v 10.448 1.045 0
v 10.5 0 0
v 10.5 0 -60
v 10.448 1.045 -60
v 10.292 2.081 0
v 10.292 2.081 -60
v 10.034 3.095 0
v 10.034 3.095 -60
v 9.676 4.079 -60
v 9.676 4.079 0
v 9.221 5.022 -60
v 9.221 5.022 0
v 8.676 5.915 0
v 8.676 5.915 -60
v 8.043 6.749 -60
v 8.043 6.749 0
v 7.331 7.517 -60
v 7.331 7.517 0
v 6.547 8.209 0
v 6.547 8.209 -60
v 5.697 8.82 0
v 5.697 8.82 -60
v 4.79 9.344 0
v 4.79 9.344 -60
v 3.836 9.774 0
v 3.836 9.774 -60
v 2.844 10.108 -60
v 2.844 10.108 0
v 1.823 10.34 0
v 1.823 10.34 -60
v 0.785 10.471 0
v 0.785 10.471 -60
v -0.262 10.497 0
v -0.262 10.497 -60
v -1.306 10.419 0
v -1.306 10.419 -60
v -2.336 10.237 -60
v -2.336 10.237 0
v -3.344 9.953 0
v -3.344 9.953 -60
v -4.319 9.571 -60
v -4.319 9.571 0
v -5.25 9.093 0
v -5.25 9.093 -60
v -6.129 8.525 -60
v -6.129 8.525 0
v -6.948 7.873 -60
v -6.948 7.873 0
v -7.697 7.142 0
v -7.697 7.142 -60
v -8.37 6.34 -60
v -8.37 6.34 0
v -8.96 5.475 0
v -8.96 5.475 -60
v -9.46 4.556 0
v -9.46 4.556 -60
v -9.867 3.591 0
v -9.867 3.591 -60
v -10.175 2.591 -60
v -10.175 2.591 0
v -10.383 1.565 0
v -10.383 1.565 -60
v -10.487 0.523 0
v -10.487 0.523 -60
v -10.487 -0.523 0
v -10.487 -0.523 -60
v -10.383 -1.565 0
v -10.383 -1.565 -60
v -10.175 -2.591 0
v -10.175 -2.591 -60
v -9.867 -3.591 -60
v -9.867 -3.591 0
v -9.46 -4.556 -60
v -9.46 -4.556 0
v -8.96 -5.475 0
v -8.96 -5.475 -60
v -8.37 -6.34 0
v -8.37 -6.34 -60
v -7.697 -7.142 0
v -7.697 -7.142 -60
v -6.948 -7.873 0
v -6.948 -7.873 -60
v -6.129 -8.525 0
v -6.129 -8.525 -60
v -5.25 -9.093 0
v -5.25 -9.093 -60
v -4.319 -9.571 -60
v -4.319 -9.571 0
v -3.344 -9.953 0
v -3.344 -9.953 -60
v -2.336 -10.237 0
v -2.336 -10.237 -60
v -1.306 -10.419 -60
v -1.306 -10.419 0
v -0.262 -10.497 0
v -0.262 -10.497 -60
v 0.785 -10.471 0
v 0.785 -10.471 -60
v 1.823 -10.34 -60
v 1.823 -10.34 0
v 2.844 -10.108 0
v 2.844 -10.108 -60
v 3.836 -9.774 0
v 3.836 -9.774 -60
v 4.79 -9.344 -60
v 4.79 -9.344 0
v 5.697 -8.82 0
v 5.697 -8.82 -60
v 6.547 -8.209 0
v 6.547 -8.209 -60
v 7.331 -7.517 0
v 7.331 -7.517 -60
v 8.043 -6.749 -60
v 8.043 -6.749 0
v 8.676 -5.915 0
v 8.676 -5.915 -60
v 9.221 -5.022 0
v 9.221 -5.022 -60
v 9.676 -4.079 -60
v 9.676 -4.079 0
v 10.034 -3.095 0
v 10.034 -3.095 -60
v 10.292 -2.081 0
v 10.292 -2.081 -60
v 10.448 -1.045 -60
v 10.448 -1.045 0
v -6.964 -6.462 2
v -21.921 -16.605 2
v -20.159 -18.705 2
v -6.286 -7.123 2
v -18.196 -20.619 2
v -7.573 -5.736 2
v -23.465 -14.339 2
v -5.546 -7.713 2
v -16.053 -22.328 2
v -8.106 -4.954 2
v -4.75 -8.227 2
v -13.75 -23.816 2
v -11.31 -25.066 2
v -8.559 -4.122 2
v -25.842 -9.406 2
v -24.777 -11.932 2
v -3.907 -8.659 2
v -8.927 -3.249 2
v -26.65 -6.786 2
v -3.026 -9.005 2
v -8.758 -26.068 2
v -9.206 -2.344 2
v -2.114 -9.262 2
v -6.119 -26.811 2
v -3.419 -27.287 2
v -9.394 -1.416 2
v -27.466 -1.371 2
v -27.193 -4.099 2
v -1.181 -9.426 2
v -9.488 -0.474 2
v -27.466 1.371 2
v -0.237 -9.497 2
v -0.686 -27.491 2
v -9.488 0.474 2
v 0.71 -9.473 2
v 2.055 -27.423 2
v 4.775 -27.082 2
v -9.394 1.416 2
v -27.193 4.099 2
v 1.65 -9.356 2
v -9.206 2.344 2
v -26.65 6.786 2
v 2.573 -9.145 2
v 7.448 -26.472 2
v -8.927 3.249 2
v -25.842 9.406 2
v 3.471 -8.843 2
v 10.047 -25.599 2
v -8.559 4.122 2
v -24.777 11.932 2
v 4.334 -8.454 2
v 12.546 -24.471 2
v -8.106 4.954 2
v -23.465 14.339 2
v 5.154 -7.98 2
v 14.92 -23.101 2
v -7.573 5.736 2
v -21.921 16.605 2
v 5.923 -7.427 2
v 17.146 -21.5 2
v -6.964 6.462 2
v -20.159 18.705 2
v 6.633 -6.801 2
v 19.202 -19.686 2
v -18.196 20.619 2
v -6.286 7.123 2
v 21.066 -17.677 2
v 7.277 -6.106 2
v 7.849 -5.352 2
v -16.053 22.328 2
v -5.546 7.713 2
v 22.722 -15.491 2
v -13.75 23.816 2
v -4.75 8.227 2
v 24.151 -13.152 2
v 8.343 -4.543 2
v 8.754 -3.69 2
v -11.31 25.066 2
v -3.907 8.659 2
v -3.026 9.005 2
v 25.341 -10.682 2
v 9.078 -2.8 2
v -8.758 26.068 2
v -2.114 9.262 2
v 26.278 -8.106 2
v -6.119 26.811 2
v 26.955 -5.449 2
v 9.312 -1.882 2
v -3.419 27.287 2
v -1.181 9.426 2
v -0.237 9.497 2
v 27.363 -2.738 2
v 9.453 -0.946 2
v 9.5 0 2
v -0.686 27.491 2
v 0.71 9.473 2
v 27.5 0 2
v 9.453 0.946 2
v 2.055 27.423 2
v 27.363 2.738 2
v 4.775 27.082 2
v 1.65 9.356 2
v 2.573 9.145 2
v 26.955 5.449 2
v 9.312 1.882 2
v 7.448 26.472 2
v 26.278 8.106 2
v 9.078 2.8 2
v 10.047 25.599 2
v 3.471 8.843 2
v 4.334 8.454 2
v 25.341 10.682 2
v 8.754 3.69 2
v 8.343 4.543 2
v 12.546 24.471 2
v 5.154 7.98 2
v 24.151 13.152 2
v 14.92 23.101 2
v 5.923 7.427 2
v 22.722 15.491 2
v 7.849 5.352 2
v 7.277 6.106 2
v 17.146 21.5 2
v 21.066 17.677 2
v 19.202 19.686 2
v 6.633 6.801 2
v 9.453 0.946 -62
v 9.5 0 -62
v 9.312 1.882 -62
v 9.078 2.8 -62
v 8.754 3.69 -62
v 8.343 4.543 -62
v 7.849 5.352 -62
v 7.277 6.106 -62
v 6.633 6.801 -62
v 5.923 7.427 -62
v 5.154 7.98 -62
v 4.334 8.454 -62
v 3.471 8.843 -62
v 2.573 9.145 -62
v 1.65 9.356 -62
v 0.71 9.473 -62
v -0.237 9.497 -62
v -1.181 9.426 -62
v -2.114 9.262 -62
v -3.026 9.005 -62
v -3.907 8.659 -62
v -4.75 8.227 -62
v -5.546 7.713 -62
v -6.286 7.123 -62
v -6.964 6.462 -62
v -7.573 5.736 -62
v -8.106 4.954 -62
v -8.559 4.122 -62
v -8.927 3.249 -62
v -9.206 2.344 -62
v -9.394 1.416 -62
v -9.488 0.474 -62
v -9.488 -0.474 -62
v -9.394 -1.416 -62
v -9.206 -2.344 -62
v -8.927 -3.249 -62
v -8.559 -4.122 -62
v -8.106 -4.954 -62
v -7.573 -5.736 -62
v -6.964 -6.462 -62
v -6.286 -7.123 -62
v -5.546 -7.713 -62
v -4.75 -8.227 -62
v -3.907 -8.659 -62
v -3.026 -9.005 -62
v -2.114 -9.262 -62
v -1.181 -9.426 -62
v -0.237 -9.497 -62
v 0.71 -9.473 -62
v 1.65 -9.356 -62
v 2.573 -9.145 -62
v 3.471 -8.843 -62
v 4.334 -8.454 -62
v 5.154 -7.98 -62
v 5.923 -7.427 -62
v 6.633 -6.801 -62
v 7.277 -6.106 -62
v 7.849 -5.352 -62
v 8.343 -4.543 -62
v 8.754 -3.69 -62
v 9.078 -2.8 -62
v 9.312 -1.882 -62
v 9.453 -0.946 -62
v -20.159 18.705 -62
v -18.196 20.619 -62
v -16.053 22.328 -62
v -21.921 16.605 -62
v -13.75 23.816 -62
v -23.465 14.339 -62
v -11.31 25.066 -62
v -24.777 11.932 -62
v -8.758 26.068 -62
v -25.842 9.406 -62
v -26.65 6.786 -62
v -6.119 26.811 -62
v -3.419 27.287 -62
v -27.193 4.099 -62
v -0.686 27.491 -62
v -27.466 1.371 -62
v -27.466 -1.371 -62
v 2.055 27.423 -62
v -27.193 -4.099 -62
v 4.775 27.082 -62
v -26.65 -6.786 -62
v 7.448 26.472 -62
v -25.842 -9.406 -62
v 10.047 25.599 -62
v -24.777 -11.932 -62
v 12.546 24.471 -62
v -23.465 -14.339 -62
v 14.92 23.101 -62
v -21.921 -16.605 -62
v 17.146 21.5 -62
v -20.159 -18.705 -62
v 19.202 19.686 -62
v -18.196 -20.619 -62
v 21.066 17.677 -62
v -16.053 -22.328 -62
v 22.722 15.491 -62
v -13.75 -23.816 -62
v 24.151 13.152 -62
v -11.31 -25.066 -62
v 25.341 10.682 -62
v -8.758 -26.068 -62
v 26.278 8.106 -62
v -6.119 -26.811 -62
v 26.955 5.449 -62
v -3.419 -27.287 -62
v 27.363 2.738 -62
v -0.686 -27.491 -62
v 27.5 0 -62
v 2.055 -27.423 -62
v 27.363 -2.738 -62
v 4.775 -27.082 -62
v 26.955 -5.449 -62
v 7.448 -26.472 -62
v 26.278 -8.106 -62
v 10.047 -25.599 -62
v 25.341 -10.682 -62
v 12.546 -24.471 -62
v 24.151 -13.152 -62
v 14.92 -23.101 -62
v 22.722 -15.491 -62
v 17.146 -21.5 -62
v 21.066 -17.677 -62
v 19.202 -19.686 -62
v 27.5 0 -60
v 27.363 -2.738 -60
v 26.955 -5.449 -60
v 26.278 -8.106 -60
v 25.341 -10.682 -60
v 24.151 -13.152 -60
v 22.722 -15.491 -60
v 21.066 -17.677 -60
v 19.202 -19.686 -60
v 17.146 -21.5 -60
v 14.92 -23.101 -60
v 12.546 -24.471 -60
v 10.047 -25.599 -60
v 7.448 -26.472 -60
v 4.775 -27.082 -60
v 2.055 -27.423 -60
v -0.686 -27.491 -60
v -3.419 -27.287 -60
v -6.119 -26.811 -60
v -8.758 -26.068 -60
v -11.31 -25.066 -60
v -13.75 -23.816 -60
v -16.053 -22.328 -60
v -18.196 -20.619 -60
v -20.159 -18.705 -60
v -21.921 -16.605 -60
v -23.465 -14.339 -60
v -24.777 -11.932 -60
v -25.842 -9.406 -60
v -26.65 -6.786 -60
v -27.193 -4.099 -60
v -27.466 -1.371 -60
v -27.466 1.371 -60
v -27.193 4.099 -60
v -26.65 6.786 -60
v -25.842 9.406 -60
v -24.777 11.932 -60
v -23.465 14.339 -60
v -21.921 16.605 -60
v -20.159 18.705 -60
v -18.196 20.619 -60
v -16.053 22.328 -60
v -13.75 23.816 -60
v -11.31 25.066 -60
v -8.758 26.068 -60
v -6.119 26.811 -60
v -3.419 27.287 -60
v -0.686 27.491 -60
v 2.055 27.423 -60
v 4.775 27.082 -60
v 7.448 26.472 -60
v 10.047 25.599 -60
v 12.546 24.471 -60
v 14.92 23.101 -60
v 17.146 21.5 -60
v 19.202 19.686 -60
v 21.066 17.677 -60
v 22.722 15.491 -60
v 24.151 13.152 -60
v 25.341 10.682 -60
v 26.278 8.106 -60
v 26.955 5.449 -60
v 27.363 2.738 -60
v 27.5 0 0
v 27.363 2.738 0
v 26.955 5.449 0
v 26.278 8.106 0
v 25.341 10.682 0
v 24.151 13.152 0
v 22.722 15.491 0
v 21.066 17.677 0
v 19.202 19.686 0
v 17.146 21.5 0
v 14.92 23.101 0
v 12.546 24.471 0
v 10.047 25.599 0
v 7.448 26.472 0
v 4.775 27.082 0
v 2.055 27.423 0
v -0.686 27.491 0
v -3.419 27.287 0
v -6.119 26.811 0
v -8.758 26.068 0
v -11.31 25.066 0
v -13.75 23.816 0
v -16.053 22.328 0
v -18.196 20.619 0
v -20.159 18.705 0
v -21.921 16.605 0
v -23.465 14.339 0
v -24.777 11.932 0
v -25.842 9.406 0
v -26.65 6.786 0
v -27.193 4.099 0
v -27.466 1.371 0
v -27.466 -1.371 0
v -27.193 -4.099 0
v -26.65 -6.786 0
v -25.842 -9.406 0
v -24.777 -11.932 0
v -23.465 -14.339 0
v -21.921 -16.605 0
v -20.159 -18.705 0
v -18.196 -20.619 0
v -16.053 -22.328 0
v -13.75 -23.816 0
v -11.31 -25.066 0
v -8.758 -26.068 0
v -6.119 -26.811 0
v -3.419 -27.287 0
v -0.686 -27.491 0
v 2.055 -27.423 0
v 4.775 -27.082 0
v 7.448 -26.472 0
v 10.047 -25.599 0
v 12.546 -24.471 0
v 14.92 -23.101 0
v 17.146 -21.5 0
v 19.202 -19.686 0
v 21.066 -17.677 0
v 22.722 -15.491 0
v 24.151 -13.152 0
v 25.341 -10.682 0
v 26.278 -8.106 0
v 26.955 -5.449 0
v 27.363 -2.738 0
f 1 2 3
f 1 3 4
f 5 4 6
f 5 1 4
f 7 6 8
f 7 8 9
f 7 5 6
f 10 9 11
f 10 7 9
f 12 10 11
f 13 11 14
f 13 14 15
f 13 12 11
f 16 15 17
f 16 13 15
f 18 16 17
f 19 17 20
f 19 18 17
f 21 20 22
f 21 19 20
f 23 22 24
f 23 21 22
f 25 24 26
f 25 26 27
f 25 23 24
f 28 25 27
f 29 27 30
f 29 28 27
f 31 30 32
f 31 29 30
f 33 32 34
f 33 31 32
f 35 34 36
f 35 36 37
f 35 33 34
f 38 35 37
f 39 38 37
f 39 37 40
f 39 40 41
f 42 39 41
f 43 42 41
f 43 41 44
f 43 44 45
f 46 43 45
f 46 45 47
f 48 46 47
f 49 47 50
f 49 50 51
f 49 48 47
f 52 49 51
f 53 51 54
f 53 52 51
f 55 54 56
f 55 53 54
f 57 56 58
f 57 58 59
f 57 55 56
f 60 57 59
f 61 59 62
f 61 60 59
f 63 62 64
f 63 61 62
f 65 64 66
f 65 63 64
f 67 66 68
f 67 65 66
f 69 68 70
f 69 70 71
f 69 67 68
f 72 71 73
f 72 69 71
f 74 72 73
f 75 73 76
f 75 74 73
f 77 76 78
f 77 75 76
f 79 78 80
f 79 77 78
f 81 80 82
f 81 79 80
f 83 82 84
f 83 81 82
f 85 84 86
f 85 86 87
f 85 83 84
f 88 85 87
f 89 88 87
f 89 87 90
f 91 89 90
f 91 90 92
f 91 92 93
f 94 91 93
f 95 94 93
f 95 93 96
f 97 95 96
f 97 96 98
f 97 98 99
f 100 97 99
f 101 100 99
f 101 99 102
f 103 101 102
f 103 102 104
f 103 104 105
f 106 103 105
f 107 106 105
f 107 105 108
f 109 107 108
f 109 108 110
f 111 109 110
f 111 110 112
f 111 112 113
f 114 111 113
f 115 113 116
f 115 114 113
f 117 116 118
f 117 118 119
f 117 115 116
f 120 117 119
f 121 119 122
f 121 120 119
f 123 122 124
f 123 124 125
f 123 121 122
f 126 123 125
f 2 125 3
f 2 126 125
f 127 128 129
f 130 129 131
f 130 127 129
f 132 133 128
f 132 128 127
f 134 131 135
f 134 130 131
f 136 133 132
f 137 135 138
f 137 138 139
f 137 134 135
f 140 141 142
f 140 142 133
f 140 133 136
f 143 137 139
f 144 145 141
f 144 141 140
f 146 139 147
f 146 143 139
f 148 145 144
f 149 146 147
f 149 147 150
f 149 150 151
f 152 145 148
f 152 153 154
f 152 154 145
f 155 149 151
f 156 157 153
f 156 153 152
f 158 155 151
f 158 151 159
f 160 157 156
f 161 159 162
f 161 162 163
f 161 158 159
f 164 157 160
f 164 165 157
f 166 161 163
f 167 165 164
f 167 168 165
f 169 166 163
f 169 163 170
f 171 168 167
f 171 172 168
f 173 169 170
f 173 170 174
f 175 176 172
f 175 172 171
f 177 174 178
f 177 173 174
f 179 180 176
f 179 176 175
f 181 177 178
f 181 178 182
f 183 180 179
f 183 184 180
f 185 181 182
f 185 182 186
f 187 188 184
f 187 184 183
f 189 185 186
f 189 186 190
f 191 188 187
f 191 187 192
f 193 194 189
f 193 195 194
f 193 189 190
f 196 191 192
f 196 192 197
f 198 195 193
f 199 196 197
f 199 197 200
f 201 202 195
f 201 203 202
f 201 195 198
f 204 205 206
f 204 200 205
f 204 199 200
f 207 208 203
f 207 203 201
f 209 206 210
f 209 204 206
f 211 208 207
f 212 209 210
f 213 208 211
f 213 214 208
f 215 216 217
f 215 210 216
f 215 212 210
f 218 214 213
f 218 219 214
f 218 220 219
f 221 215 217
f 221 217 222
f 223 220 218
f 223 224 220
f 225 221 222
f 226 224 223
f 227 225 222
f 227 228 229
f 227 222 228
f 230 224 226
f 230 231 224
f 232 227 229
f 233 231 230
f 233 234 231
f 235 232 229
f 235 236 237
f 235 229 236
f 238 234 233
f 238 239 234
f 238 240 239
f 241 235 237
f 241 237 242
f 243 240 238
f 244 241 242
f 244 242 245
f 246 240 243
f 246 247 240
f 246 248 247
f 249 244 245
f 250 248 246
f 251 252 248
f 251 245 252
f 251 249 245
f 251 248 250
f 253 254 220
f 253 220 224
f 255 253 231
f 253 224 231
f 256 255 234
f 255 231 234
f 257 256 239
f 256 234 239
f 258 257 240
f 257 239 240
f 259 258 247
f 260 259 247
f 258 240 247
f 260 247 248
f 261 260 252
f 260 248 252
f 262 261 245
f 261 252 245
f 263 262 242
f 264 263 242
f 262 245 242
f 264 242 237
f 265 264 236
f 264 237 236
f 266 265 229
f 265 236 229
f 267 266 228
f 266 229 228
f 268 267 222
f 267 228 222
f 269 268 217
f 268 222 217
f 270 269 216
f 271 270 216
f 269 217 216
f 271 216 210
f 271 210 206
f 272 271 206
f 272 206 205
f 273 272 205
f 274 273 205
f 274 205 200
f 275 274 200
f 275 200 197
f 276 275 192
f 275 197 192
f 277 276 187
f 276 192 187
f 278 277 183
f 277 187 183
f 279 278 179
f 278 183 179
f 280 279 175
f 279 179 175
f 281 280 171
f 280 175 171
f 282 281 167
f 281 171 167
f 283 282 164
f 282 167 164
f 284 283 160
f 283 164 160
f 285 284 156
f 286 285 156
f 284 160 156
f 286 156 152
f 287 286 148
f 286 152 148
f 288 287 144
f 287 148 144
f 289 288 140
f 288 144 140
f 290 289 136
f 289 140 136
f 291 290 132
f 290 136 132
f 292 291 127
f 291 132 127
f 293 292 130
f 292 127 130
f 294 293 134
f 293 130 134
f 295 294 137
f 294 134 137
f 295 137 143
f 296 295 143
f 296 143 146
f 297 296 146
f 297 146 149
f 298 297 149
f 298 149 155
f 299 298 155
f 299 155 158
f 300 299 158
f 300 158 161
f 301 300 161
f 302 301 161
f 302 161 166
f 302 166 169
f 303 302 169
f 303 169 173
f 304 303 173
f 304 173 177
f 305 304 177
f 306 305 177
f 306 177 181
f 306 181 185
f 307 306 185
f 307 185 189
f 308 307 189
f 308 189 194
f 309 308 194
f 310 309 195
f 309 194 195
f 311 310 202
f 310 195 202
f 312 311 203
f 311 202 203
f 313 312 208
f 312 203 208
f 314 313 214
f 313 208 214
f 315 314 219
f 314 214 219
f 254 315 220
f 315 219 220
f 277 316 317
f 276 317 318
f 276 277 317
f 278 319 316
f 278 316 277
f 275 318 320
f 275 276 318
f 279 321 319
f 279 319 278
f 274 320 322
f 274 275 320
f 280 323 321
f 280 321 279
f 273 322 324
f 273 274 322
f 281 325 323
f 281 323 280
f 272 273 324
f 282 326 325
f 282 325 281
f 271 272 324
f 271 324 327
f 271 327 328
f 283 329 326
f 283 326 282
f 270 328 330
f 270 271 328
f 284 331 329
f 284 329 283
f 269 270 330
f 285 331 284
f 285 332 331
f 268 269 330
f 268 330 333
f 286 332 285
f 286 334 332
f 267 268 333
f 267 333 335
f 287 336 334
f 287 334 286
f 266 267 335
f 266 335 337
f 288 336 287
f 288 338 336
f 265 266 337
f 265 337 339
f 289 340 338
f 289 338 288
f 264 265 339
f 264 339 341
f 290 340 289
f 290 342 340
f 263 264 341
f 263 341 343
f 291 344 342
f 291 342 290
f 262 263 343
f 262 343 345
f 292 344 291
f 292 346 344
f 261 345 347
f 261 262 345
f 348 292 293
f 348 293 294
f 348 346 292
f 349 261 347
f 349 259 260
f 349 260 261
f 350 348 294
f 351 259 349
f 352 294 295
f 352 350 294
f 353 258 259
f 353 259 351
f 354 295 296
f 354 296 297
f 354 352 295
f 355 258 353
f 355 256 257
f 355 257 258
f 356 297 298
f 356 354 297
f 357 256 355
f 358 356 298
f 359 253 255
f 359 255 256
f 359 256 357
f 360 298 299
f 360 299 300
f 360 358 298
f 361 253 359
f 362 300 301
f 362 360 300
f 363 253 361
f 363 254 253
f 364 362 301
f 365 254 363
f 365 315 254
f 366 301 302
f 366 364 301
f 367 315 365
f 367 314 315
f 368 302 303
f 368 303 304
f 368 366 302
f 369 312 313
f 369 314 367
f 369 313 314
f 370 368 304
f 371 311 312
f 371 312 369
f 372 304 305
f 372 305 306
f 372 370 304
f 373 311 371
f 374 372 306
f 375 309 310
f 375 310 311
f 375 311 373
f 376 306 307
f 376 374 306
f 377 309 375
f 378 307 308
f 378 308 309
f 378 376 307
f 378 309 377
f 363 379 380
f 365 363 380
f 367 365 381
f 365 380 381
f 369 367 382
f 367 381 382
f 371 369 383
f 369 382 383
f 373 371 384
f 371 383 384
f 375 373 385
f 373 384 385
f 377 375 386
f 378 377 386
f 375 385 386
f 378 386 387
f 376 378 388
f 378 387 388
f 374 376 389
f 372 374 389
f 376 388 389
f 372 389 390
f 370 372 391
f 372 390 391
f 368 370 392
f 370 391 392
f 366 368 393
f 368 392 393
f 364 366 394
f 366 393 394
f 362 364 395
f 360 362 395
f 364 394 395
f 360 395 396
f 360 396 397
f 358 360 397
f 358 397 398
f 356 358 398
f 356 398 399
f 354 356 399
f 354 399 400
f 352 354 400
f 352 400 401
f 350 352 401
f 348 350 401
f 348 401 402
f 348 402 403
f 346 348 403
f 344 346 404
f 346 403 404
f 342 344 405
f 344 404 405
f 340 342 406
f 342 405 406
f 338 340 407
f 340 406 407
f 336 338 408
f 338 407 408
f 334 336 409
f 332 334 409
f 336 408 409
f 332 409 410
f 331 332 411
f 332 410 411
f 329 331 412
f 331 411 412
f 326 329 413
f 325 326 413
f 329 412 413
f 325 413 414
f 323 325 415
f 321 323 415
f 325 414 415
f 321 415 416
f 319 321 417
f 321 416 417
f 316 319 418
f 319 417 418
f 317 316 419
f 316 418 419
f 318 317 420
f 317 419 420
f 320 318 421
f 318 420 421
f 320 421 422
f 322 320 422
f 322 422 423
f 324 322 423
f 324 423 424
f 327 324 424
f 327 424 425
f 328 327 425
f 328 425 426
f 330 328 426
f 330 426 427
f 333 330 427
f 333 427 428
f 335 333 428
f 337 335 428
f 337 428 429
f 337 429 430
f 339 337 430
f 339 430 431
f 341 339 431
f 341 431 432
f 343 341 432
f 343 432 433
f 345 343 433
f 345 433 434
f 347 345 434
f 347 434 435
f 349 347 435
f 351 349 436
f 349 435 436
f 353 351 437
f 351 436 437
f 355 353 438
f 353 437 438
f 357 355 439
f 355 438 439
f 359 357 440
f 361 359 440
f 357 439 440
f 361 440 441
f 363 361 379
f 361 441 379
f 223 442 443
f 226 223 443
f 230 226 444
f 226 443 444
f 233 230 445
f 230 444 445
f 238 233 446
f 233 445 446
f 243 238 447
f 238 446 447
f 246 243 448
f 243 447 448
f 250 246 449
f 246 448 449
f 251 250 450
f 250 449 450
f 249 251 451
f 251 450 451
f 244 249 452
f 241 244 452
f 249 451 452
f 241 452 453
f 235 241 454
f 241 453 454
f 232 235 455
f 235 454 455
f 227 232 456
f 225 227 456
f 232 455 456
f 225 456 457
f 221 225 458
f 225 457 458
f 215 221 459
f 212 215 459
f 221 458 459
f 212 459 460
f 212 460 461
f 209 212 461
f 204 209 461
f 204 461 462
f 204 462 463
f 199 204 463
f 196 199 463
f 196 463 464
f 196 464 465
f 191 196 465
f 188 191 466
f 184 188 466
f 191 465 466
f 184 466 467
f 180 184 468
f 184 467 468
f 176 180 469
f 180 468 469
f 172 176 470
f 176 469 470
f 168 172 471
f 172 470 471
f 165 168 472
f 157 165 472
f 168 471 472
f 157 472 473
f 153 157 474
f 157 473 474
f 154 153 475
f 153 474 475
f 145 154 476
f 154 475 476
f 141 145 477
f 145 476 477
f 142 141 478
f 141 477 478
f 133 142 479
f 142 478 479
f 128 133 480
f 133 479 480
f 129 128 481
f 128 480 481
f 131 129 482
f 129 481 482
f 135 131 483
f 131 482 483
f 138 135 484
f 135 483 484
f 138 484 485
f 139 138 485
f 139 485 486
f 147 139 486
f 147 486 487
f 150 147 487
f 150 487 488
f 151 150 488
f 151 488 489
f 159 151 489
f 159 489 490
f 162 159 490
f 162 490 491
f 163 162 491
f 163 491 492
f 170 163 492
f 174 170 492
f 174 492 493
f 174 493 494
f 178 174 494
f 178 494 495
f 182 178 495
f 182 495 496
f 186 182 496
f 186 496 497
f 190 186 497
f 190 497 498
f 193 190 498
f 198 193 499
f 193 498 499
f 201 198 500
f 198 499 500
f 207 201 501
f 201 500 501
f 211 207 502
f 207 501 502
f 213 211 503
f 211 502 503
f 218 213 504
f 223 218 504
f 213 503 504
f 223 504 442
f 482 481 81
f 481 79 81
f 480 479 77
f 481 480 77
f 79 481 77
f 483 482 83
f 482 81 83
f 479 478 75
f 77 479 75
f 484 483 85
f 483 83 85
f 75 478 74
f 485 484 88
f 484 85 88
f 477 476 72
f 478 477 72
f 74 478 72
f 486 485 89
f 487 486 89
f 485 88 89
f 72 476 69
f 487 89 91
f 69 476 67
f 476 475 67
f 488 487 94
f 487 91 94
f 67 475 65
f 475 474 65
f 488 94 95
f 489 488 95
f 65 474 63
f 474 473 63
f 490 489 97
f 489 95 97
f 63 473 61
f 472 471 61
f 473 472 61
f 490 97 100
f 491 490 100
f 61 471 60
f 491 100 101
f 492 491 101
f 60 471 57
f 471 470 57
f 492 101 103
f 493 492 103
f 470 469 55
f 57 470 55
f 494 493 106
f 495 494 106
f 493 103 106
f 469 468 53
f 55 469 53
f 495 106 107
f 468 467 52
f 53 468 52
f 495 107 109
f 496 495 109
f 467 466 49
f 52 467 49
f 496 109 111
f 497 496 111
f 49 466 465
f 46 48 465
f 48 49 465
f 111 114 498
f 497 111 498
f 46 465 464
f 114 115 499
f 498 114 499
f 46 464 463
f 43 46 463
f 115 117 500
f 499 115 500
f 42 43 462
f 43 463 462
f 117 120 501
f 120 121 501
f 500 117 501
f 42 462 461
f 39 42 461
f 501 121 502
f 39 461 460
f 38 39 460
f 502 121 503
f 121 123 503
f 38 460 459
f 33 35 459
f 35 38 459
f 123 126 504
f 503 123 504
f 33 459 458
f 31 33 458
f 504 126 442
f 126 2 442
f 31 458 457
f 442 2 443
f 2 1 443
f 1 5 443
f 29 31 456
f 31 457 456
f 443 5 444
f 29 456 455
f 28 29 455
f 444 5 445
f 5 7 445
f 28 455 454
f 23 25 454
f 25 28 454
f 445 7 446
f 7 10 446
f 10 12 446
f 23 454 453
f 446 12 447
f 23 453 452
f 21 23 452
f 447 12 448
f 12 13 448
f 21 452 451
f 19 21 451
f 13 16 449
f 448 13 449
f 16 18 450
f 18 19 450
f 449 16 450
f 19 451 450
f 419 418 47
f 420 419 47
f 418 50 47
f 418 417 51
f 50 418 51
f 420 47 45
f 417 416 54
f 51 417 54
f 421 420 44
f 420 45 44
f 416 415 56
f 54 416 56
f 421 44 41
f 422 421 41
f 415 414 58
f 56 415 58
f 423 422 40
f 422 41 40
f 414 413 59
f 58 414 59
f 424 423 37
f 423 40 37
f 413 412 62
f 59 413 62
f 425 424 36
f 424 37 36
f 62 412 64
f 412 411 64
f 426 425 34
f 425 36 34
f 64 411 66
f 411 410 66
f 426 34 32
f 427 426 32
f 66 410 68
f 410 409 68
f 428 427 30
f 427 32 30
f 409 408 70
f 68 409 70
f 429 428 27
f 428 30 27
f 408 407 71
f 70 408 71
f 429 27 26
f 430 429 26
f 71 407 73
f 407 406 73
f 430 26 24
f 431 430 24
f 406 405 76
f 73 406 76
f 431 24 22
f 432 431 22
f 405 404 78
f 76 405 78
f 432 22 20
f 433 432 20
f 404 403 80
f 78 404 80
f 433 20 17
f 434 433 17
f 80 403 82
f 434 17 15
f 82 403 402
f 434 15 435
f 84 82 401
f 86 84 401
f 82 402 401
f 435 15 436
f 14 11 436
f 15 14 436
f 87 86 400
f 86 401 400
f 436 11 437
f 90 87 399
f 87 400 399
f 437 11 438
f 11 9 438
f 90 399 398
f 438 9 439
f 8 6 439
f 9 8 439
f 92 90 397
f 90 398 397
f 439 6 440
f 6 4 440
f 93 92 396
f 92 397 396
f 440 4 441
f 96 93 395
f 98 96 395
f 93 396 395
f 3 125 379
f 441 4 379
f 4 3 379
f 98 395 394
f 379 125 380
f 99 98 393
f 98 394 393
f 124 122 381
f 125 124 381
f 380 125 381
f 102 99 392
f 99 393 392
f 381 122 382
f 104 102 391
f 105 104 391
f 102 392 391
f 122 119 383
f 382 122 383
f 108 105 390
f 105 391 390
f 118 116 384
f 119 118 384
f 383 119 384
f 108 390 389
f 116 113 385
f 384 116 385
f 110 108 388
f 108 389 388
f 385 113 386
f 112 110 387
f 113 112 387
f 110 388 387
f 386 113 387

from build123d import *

# Parameters (mm, degrees)
F0_R     = 27.5
F2_DEPTH = 2
F1_R     = 10.5
F3_DEPTH = 60
F4_R     = 27.5
F5_DEPTH = 2
F6_R     = 9.5
F7_DEPTH = 64


with BuildPart() as f2:
    # F0 (on Top) → F2 (new body)
    with BuildSketch(Plane.XY):
        Circle(F0_R)
    extrude(amount=F2_DEPTH)

    # F1 (on Top) → F3 (join)
    with BuildSketch(Plane.XY):
        Circle(F1_R)
    extrude(amount=-F3_DEPTH)

    # F4 (on face) → F5 (join)
    with BuildSketch(Plane(origin=(0, 0, -60), x_dir=(1, 0, 0), z_dir=(0, 0, -1))):
        Circle(F4_R)
    extrude(amount=F5_DEPTH)

    # F6 (on face) → F7 (cut, through all)
    with BuildSketch(Plane.XY.offset(2)):
        Circle(F6_R)
    extrude(amount=-F7_DEPTH, mode=Mode.SUBTRACT)


solid = f2.part
